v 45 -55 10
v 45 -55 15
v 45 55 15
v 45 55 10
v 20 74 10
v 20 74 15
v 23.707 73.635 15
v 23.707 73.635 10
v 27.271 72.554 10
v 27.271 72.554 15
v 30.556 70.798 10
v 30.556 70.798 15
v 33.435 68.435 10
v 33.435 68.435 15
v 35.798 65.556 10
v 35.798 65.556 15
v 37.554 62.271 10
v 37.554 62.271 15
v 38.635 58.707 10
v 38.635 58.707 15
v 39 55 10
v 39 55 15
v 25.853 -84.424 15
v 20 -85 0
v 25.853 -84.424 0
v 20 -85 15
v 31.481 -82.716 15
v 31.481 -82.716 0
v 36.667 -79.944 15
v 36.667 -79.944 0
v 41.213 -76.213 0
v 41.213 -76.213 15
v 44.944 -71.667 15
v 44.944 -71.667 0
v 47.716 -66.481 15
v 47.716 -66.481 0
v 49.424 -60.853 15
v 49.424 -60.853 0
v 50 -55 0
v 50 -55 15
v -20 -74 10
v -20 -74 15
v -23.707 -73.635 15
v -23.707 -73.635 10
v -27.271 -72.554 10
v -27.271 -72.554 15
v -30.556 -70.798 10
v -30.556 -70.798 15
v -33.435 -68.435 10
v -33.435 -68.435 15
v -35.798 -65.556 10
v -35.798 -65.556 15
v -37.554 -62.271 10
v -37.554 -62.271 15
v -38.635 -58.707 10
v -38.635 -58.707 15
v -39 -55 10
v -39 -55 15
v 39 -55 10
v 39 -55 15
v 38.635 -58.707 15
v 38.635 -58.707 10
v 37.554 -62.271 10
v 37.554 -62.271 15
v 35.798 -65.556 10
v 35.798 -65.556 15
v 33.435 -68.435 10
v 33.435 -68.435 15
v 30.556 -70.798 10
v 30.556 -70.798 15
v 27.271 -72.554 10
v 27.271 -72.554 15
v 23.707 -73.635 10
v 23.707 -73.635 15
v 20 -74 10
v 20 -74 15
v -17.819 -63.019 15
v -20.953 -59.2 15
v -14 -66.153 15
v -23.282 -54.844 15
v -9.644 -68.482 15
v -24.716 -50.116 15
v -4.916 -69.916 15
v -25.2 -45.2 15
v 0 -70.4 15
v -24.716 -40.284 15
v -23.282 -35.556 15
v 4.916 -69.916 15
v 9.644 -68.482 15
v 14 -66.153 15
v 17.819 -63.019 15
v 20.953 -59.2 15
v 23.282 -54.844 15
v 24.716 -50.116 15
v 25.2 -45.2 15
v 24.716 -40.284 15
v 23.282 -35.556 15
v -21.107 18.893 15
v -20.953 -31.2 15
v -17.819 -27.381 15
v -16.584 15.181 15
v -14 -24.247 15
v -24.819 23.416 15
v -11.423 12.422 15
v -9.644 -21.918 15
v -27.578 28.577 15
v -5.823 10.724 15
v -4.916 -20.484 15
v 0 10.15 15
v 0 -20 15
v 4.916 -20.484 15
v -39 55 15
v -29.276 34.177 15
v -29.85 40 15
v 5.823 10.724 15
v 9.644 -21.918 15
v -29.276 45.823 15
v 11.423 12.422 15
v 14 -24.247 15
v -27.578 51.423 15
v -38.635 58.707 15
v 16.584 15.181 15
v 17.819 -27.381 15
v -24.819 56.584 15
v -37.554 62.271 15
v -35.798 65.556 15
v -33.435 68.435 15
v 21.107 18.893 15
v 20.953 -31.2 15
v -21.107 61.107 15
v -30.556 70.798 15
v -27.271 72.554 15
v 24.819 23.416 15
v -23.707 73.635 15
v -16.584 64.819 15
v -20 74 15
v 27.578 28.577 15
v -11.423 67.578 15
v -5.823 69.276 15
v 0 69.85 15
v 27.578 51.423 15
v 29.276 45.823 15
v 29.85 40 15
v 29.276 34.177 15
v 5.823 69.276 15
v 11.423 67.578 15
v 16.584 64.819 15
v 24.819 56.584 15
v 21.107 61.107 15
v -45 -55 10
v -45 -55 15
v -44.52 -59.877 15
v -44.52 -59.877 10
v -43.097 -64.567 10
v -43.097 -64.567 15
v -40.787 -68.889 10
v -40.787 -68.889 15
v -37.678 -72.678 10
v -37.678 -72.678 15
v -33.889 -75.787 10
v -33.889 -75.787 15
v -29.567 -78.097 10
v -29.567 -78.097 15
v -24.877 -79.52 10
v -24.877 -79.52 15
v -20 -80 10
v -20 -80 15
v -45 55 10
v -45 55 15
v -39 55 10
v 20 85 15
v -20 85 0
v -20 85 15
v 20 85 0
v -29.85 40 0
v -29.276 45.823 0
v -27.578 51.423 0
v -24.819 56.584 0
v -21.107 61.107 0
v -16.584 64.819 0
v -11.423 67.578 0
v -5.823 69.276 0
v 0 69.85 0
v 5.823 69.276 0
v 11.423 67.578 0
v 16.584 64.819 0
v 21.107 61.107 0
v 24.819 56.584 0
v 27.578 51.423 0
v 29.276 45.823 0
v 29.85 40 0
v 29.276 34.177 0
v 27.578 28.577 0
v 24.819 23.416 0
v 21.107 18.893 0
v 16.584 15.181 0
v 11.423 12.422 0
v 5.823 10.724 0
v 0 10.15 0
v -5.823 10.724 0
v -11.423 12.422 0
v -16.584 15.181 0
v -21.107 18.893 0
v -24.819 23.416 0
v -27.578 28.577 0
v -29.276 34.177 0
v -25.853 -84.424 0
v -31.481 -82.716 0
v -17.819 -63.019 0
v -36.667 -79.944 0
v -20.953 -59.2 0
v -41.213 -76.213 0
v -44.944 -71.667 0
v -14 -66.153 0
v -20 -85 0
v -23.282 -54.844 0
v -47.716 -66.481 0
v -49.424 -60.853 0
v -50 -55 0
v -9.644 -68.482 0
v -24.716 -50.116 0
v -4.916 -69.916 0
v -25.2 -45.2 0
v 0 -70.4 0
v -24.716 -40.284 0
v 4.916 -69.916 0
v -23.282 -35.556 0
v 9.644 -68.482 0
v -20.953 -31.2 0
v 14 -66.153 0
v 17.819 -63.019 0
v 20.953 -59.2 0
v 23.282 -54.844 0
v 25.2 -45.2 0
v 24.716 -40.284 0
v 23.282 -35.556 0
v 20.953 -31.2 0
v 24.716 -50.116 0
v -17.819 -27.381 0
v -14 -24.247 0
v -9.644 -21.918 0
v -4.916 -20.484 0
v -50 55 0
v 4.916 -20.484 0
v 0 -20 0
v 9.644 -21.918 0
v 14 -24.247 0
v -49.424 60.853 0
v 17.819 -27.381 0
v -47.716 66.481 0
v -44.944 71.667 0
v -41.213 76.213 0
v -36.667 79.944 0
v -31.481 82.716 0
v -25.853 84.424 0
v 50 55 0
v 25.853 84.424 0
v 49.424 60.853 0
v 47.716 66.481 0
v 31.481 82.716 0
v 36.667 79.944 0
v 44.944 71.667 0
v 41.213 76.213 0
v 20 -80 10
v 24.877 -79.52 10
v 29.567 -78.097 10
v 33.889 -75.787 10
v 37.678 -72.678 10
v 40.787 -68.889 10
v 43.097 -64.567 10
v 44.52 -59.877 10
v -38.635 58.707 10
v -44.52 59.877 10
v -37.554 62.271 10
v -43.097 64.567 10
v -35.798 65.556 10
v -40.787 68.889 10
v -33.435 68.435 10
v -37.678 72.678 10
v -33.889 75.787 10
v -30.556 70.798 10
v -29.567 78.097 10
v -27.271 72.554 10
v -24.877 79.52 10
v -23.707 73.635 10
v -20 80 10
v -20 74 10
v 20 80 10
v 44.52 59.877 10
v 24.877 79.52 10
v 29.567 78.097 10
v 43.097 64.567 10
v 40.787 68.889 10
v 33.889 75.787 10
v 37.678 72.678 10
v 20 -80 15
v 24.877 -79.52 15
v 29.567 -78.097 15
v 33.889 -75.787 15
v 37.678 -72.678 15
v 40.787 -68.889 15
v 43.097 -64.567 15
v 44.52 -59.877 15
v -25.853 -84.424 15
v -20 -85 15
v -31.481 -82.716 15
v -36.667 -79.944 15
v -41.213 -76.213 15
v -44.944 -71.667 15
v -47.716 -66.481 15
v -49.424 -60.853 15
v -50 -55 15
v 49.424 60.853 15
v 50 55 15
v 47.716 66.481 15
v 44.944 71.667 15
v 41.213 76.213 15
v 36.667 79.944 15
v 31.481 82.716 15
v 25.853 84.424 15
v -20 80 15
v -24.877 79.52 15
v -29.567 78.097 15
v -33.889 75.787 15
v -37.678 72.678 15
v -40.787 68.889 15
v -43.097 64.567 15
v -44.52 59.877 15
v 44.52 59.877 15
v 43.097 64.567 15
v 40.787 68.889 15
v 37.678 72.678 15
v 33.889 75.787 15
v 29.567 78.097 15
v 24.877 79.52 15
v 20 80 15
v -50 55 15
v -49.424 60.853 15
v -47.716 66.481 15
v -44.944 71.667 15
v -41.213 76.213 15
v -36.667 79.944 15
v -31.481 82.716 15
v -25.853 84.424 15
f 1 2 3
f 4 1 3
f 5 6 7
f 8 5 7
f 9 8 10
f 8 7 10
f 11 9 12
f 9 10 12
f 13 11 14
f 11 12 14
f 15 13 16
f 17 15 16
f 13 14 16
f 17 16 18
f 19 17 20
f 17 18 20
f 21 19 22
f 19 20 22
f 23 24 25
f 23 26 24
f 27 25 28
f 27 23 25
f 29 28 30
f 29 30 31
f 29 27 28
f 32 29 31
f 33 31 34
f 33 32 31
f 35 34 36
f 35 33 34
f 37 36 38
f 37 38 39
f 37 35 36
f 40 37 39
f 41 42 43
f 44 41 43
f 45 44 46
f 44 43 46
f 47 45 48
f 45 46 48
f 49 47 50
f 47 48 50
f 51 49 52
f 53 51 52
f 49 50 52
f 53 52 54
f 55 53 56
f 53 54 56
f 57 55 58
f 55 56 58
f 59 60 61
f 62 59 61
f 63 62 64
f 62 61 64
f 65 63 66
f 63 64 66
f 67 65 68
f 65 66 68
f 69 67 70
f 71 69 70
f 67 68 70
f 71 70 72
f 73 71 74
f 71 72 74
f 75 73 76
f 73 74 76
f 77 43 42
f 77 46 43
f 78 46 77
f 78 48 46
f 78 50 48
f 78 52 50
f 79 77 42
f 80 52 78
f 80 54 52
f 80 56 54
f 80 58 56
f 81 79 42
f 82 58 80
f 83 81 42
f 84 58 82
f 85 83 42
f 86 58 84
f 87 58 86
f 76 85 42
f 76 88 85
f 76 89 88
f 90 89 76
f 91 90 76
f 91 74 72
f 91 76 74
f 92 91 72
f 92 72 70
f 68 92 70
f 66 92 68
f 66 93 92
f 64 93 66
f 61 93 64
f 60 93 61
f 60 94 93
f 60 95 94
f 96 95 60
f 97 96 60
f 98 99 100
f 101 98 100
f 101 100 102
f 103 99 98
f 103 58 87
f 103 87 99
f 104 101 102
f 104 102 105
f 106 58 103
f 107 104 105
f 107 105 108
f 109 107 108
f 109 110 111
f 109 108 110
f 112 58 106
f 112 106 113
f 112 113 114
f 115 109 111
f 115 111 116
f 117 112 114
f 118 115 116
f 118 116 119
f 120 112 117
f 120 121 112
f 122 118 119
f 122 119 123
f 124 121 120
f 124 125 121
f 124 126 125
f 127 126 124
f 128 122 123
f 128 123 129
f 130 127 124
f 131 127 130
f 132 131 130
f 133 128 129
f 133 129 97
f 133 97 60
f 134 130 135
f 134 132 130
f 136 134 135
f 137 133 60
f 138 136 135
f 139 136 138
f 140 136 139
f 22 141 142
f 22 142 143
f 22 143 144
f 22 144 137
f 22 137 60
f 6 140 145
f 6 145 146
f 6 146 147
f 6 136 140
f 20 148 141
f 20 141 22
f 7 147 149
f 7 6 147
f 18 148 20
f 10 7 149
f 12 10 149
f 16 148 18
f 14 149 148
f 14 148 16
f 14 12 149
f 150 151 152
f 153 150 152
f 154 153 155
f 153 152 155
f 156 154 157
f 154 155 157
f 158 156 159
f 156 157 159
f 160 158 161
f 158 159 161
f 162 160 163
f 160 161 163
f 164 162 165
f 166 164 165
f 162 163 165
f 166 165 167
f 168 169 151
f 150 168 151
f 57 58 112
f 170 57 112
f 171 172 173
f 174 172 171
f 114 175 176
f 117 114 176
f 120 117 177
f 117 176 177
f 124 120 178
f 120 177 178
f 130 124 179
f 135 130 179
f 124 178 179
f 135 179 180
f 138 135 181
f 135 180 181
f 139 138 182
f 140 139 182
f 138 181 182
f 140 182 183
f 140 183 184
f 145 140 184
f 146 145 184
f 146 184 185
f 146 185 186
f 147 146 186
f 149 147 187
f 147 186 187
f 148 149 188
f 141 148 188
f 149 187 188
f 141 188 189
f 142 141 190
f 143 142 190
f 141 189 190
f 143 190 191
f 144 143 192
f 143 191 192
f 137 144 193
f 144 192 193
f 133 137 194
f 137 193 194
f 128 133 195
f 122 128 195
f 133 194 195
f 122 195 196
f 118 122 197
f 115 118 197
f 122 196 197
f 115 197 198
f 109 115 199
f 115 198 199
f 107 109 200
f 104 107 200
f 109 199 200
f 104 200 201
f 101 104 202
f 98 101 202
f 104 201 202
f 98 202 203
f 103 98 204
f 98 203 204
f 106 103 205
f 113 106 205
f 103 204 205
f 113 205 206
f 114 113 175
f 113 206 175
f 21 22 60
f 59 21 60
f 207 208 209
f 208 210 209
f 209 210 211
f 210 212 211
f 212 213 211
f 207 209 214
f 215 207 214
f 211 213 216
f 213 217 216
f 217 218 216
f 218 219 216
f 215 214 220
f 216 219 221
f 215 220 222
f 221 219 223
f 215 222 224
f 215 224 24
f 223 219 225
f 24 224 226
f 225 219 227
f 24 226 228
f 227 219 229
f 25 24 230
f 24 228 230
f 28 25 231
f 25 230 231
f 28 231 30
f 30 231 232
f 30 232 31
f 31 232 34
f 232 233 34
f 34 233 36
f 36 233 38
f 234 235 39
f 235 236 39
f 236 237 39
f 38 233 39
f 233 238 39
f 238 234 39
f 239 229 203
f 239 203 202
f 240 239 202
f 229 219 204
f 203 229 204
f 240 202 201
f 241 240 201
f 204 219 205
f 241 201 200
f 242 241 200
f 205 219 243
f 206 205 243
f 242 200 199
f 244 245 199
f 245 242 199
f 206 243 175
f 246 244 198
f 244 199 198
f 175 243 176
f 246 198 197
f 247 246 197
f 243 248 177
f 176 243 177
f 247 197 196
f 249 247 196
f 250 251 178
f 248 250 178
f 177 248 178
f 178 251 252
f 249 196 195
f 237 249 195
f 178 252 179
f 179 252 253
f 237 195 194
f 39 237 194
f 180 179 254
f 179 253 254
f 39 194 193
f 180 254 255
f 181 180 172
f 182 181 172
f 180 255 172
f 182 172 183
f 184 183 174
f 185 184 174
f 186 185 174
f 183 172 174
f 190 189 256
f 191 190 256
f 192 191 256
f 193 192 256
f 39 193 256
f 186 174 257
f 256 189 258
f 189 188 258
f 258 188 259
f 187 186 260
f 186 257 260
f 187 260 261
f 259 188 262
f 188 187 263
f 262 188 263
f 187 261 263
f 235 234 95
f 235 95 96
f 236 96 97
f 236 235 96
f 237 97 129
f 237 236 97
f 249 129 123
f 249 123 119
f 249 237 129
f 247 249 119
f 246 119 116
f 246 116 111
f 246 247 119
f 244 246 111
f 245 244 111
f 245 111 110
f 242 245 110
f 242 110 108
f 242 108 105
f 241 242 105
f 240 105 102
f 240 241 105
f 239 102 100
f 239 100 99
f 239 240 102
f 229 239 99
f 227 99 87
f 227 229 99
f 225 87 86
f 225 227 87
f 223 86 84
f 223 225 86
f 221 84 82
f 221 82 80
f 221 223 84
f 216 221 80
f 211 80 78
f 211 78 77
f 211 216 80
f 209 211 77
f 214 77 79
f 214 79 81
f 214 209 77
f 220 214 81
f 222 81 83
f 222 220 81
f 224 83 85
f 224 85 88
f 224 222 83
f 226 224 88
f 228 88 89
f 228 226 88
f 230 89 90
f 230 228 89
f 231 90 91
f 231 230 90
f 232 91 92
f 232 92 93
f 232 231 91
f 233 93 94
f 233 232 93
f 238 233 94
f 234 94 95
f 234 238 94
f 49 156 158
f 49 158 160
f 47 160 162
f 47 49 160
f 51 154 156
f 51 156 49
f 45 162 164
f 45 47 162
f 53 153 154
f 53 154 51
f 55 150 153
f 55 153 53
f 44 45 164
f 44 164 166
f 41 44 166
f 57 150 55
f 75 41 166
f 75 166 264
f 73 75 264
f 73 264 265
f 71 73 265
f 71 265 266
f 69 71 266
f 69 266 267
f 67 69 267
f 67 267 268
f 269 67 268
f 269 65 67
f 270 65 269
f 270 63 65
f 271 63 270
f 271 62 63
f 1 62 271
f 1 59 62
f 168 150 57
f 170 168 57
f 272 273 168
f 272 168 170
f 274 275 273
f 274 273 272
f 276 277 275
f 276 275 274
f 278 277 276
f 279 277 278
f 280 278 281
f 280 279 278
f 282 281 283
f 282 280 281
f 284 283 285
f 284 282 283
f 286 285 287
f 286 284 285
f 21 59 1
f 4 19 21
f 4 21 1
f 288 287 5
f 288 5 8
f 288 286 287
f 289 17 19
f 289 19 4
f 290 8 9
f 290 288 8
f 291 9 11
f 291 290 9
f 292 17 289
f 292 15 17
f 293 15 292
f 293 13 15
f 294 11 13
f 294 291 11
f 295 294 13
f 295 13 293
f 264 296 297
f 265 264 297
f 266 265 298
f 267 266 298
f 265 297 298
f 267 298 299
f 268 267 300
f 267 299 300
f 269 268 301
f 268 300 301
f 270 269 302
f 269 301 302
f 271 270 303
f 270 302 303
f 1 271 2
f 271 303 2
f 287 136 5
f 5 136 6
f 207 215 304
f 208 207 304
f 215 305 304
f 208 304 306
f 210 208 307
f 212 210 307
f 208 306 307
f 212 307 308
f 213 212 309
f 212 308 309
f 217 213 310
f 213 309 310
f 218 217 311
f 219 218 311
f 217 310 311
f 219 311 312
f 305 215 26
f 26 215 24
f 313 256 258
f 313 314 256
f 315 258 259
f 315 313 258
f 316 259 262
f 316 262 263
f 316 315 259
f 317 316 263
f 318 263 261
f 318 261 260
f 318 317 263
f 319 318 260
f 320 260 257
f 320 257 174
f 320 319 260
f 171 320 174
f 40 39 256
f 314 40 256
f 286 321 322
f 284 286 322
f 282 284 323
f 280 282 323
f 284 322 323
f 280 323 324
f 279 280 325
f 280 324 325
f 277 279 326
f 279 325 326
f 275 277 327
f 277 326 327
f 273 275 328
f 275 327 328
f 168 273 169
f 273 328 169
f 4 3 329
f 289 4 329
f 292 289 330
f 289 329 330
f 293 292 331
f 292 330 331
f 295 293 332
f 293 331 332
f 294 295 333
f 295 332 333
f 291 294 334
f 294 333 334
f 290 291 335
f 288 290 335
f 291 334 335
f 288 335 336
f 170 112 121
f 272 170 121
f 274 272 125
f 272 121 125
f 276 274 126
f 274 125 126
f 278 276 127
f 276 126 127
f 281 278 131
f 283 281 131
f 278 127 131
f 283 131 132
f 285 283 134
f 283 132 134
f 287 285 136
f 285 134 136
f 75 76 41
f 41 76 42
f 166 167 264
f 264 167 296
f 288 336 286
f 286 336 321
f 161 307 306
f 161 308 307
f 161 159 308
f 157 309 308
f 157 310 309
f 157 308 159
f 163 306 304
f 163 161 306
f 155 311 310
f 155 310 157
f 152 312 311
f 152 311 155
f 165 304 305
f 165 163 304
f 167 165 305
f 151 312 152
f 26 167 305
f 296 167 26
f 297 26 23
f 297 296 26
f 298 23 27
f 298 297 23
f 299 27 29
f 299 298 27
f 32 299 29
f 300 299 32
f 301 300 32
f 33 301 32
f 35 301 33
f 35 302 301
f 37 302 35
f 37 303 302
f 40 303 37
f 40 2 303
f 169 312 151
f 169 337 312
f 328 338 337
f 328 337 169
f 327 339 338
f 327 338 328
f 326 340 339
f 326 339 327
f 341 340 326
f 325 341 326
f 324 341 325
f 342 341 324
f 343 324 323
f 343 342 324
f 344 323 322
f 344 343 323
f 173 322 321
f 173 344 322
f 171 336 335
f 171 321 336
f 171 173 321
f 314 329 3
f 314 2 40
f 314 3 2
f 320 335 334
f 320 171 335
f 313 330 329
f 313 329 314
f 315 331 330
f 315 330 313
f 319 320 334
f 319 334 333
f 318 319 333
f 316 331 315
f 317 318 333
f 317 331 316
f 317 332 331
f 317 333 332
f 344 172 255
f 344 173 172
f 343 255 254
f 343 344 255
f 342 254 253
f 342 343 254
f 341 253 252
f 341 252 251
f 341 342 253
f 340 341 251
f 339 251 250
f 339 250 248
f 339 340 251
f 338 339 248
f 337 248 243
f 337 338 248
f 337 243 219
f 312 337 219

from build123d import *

# Parameters (mm, degrees)
F0_R     = 25.2
F0_W     = 100
F0_H     = 15
F1_DEPTH = 15
F2_R     = 30
F5_DEPTH = 5


with BuildPart() as f1:
    # F0 (on Top) → F1 (new body)
    with BuildSketch(Plane.XY):
        with BuildLine():
            Line((-50, -85), (50, -85))
            Line((50, -85), (50, 40))
            Line((50, 40), (29.85, 40))
            ThreePointArc((29.85, 40), (0, 10.15), (-29.85, 40))
            Line((-29.85, 40), (-50, 40))
            Line((-50, 40), (-50, -85))
        make_face()
        with Locations((0, -45.2)):
            Circle(F0_R, mode=Mode.SUBTRACT)
        with BuildLine():
            Line((29.85, 40), (50, 40))
            Line((50, 40), (50, 70))
            Line((50, 70), (-50, 70))
            Line((-50, 70), (-50, 40))
            Line((-50, 40), (-29.85, 40))
            ThreePointArc((-29.85, 40), (0, 69.85), (29.85, 40))
        make_face()
        with Locations((0, 77.5)):
            Rectangle(F0_W, F0_H)
    extrude(amount=F1_DEPTH)

    # F2
    f2_edges = [f1.edges().sort_by_distance(p)[0] for p in [
        (-50, 85, 7.5),
        (50, 85, 7.5),
        (-50, -85, 7.5),
        (50, -85, 7.5),
    ]]
    fillet(f2_edges, radius=F2_R)

    # F4 (on face) → F5 (cut)
    with BuildSketch(Plane.XY.offset(15)):
        with BuildLine():
            ThreePointArc((45, 55), (37.67767, 72.67767), (20, 80))
            Line((20, 80), (-20, 80))
            ThreePointArc((-20, 80), (-37.67767, 72.67767), (-45, 55))
            Line((-45, 55), (-45, -55))
            ThreePointArc((-45, -55), (-37.67767, -72.67767), (-20, -80))
            Line((-20, -80), (20, -80))
            ThreePointArc((20, -80), (37.67767, -72.67767), (45, -55))
            Line((45, -55), (45, 55))
        make_face()
        with BuildLine():
            Line((-20, 74), (20, 74))
            ThreePointArc((20, 74), (33.435029, 68.435029), (39, 55))
            Line((39, 55), (39, -55))
            ThreePointArc((39, -55), (33.435029, -68.435029), (20, -74))
            Line((20, -74), (-20, -74))
            ThreePointArc((-20, -74), (-33.435029, -68.435029), (-39, -55))
            Line((-39, -55), (-39, 55))
            ThreePointArc((-39, 55), (-33.435029, 68.435029), (-20, 74))
        make_face(mode=Mode.SUBTRACT)
    extrude(amount=-F5_DEPTH, mode=Mode.SUBTRACT)


solid = f1.part
